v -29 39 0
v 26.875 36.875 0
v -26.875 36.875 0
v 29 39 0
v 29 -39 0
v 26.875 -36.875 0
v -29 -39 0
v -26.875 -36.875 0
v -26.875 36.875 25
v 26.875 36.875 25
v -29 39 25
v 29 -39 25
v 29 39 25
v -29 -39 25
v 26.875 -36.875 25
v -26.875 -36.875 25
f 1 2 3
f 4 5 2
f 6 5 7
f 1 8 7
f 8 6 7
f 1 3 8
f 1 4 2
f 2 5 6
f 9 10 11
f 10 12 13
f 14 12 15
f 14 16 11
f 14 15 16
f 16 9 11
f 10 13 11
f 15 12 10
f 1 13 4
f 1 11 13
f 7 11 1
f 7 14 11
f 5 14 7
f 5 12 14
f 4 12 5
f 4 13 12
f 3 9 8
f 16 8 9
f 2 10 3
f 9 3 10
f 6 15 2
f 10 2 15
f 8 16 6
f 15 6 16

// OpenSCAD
//translate([-38.35,-56.5,0])
//translate([30,25.7,0]){
//#rotate([90,0,0])
//{
//    //Gutter dimensions are [76.7,113.1,185]
//import("C:/Users/Steven/Downloads/Gutter_downspout.stl");
//}
//}

//translate([0,0,30])
//difference()
//{
//cube([56.5,76.5,8],true);
//    translate([0,0,-1])cube([71.7,108.1,11],true);
//}

//translate([45,55,0])
//tube(60.5/2,4.25,25);
//translate([0,0,60])
squareTube(58,78,4.25,25);

//translate([-60.5,0,25])
//rotate([90,0,0])
//elbowPipe(60.5, 20, 90, 4.25);


module tube(outerDiameter, wallThickness, height)
{
    linear_extrude(height,true)
    difference()
    {
        circle(outerDiameter,true);
        circle(outerDiameter-wallThickness,true);
    }
}

module elbow(radius, length, angle)
{
    translate([-length,radius])
    rotate([0,90,0]) 
    cylinder(r=radius, h = length, $fn=100);
    
    #rotate_extrude(angle=angle, convexity=10, $fn=100)
    translate([radius,0])
    #circle(radius);
    
    translate([radius,0])
    rotate([90,0,0]) 
    cylinder(r=radius, h = length*2, $fn=100);
}


module elbowPipe(radius,length, angle, wallThickness)
{
    difference()
    {
        elbow(radius,length,angle);
        
        translate([wallThickness,wallThickness])
        elbow(radius-wallThickness, length+wallThickness+1, angle);
    }
}

module squareTube(outerwidth, outerheight, wallThickness, height)
{
        linear_extrude(height,true)
    difference()
    {
        square([outerwidth, outerheight],true);
        square([outerwidth-wallThickness,outerheight-wallThickness],true);
    }
}
